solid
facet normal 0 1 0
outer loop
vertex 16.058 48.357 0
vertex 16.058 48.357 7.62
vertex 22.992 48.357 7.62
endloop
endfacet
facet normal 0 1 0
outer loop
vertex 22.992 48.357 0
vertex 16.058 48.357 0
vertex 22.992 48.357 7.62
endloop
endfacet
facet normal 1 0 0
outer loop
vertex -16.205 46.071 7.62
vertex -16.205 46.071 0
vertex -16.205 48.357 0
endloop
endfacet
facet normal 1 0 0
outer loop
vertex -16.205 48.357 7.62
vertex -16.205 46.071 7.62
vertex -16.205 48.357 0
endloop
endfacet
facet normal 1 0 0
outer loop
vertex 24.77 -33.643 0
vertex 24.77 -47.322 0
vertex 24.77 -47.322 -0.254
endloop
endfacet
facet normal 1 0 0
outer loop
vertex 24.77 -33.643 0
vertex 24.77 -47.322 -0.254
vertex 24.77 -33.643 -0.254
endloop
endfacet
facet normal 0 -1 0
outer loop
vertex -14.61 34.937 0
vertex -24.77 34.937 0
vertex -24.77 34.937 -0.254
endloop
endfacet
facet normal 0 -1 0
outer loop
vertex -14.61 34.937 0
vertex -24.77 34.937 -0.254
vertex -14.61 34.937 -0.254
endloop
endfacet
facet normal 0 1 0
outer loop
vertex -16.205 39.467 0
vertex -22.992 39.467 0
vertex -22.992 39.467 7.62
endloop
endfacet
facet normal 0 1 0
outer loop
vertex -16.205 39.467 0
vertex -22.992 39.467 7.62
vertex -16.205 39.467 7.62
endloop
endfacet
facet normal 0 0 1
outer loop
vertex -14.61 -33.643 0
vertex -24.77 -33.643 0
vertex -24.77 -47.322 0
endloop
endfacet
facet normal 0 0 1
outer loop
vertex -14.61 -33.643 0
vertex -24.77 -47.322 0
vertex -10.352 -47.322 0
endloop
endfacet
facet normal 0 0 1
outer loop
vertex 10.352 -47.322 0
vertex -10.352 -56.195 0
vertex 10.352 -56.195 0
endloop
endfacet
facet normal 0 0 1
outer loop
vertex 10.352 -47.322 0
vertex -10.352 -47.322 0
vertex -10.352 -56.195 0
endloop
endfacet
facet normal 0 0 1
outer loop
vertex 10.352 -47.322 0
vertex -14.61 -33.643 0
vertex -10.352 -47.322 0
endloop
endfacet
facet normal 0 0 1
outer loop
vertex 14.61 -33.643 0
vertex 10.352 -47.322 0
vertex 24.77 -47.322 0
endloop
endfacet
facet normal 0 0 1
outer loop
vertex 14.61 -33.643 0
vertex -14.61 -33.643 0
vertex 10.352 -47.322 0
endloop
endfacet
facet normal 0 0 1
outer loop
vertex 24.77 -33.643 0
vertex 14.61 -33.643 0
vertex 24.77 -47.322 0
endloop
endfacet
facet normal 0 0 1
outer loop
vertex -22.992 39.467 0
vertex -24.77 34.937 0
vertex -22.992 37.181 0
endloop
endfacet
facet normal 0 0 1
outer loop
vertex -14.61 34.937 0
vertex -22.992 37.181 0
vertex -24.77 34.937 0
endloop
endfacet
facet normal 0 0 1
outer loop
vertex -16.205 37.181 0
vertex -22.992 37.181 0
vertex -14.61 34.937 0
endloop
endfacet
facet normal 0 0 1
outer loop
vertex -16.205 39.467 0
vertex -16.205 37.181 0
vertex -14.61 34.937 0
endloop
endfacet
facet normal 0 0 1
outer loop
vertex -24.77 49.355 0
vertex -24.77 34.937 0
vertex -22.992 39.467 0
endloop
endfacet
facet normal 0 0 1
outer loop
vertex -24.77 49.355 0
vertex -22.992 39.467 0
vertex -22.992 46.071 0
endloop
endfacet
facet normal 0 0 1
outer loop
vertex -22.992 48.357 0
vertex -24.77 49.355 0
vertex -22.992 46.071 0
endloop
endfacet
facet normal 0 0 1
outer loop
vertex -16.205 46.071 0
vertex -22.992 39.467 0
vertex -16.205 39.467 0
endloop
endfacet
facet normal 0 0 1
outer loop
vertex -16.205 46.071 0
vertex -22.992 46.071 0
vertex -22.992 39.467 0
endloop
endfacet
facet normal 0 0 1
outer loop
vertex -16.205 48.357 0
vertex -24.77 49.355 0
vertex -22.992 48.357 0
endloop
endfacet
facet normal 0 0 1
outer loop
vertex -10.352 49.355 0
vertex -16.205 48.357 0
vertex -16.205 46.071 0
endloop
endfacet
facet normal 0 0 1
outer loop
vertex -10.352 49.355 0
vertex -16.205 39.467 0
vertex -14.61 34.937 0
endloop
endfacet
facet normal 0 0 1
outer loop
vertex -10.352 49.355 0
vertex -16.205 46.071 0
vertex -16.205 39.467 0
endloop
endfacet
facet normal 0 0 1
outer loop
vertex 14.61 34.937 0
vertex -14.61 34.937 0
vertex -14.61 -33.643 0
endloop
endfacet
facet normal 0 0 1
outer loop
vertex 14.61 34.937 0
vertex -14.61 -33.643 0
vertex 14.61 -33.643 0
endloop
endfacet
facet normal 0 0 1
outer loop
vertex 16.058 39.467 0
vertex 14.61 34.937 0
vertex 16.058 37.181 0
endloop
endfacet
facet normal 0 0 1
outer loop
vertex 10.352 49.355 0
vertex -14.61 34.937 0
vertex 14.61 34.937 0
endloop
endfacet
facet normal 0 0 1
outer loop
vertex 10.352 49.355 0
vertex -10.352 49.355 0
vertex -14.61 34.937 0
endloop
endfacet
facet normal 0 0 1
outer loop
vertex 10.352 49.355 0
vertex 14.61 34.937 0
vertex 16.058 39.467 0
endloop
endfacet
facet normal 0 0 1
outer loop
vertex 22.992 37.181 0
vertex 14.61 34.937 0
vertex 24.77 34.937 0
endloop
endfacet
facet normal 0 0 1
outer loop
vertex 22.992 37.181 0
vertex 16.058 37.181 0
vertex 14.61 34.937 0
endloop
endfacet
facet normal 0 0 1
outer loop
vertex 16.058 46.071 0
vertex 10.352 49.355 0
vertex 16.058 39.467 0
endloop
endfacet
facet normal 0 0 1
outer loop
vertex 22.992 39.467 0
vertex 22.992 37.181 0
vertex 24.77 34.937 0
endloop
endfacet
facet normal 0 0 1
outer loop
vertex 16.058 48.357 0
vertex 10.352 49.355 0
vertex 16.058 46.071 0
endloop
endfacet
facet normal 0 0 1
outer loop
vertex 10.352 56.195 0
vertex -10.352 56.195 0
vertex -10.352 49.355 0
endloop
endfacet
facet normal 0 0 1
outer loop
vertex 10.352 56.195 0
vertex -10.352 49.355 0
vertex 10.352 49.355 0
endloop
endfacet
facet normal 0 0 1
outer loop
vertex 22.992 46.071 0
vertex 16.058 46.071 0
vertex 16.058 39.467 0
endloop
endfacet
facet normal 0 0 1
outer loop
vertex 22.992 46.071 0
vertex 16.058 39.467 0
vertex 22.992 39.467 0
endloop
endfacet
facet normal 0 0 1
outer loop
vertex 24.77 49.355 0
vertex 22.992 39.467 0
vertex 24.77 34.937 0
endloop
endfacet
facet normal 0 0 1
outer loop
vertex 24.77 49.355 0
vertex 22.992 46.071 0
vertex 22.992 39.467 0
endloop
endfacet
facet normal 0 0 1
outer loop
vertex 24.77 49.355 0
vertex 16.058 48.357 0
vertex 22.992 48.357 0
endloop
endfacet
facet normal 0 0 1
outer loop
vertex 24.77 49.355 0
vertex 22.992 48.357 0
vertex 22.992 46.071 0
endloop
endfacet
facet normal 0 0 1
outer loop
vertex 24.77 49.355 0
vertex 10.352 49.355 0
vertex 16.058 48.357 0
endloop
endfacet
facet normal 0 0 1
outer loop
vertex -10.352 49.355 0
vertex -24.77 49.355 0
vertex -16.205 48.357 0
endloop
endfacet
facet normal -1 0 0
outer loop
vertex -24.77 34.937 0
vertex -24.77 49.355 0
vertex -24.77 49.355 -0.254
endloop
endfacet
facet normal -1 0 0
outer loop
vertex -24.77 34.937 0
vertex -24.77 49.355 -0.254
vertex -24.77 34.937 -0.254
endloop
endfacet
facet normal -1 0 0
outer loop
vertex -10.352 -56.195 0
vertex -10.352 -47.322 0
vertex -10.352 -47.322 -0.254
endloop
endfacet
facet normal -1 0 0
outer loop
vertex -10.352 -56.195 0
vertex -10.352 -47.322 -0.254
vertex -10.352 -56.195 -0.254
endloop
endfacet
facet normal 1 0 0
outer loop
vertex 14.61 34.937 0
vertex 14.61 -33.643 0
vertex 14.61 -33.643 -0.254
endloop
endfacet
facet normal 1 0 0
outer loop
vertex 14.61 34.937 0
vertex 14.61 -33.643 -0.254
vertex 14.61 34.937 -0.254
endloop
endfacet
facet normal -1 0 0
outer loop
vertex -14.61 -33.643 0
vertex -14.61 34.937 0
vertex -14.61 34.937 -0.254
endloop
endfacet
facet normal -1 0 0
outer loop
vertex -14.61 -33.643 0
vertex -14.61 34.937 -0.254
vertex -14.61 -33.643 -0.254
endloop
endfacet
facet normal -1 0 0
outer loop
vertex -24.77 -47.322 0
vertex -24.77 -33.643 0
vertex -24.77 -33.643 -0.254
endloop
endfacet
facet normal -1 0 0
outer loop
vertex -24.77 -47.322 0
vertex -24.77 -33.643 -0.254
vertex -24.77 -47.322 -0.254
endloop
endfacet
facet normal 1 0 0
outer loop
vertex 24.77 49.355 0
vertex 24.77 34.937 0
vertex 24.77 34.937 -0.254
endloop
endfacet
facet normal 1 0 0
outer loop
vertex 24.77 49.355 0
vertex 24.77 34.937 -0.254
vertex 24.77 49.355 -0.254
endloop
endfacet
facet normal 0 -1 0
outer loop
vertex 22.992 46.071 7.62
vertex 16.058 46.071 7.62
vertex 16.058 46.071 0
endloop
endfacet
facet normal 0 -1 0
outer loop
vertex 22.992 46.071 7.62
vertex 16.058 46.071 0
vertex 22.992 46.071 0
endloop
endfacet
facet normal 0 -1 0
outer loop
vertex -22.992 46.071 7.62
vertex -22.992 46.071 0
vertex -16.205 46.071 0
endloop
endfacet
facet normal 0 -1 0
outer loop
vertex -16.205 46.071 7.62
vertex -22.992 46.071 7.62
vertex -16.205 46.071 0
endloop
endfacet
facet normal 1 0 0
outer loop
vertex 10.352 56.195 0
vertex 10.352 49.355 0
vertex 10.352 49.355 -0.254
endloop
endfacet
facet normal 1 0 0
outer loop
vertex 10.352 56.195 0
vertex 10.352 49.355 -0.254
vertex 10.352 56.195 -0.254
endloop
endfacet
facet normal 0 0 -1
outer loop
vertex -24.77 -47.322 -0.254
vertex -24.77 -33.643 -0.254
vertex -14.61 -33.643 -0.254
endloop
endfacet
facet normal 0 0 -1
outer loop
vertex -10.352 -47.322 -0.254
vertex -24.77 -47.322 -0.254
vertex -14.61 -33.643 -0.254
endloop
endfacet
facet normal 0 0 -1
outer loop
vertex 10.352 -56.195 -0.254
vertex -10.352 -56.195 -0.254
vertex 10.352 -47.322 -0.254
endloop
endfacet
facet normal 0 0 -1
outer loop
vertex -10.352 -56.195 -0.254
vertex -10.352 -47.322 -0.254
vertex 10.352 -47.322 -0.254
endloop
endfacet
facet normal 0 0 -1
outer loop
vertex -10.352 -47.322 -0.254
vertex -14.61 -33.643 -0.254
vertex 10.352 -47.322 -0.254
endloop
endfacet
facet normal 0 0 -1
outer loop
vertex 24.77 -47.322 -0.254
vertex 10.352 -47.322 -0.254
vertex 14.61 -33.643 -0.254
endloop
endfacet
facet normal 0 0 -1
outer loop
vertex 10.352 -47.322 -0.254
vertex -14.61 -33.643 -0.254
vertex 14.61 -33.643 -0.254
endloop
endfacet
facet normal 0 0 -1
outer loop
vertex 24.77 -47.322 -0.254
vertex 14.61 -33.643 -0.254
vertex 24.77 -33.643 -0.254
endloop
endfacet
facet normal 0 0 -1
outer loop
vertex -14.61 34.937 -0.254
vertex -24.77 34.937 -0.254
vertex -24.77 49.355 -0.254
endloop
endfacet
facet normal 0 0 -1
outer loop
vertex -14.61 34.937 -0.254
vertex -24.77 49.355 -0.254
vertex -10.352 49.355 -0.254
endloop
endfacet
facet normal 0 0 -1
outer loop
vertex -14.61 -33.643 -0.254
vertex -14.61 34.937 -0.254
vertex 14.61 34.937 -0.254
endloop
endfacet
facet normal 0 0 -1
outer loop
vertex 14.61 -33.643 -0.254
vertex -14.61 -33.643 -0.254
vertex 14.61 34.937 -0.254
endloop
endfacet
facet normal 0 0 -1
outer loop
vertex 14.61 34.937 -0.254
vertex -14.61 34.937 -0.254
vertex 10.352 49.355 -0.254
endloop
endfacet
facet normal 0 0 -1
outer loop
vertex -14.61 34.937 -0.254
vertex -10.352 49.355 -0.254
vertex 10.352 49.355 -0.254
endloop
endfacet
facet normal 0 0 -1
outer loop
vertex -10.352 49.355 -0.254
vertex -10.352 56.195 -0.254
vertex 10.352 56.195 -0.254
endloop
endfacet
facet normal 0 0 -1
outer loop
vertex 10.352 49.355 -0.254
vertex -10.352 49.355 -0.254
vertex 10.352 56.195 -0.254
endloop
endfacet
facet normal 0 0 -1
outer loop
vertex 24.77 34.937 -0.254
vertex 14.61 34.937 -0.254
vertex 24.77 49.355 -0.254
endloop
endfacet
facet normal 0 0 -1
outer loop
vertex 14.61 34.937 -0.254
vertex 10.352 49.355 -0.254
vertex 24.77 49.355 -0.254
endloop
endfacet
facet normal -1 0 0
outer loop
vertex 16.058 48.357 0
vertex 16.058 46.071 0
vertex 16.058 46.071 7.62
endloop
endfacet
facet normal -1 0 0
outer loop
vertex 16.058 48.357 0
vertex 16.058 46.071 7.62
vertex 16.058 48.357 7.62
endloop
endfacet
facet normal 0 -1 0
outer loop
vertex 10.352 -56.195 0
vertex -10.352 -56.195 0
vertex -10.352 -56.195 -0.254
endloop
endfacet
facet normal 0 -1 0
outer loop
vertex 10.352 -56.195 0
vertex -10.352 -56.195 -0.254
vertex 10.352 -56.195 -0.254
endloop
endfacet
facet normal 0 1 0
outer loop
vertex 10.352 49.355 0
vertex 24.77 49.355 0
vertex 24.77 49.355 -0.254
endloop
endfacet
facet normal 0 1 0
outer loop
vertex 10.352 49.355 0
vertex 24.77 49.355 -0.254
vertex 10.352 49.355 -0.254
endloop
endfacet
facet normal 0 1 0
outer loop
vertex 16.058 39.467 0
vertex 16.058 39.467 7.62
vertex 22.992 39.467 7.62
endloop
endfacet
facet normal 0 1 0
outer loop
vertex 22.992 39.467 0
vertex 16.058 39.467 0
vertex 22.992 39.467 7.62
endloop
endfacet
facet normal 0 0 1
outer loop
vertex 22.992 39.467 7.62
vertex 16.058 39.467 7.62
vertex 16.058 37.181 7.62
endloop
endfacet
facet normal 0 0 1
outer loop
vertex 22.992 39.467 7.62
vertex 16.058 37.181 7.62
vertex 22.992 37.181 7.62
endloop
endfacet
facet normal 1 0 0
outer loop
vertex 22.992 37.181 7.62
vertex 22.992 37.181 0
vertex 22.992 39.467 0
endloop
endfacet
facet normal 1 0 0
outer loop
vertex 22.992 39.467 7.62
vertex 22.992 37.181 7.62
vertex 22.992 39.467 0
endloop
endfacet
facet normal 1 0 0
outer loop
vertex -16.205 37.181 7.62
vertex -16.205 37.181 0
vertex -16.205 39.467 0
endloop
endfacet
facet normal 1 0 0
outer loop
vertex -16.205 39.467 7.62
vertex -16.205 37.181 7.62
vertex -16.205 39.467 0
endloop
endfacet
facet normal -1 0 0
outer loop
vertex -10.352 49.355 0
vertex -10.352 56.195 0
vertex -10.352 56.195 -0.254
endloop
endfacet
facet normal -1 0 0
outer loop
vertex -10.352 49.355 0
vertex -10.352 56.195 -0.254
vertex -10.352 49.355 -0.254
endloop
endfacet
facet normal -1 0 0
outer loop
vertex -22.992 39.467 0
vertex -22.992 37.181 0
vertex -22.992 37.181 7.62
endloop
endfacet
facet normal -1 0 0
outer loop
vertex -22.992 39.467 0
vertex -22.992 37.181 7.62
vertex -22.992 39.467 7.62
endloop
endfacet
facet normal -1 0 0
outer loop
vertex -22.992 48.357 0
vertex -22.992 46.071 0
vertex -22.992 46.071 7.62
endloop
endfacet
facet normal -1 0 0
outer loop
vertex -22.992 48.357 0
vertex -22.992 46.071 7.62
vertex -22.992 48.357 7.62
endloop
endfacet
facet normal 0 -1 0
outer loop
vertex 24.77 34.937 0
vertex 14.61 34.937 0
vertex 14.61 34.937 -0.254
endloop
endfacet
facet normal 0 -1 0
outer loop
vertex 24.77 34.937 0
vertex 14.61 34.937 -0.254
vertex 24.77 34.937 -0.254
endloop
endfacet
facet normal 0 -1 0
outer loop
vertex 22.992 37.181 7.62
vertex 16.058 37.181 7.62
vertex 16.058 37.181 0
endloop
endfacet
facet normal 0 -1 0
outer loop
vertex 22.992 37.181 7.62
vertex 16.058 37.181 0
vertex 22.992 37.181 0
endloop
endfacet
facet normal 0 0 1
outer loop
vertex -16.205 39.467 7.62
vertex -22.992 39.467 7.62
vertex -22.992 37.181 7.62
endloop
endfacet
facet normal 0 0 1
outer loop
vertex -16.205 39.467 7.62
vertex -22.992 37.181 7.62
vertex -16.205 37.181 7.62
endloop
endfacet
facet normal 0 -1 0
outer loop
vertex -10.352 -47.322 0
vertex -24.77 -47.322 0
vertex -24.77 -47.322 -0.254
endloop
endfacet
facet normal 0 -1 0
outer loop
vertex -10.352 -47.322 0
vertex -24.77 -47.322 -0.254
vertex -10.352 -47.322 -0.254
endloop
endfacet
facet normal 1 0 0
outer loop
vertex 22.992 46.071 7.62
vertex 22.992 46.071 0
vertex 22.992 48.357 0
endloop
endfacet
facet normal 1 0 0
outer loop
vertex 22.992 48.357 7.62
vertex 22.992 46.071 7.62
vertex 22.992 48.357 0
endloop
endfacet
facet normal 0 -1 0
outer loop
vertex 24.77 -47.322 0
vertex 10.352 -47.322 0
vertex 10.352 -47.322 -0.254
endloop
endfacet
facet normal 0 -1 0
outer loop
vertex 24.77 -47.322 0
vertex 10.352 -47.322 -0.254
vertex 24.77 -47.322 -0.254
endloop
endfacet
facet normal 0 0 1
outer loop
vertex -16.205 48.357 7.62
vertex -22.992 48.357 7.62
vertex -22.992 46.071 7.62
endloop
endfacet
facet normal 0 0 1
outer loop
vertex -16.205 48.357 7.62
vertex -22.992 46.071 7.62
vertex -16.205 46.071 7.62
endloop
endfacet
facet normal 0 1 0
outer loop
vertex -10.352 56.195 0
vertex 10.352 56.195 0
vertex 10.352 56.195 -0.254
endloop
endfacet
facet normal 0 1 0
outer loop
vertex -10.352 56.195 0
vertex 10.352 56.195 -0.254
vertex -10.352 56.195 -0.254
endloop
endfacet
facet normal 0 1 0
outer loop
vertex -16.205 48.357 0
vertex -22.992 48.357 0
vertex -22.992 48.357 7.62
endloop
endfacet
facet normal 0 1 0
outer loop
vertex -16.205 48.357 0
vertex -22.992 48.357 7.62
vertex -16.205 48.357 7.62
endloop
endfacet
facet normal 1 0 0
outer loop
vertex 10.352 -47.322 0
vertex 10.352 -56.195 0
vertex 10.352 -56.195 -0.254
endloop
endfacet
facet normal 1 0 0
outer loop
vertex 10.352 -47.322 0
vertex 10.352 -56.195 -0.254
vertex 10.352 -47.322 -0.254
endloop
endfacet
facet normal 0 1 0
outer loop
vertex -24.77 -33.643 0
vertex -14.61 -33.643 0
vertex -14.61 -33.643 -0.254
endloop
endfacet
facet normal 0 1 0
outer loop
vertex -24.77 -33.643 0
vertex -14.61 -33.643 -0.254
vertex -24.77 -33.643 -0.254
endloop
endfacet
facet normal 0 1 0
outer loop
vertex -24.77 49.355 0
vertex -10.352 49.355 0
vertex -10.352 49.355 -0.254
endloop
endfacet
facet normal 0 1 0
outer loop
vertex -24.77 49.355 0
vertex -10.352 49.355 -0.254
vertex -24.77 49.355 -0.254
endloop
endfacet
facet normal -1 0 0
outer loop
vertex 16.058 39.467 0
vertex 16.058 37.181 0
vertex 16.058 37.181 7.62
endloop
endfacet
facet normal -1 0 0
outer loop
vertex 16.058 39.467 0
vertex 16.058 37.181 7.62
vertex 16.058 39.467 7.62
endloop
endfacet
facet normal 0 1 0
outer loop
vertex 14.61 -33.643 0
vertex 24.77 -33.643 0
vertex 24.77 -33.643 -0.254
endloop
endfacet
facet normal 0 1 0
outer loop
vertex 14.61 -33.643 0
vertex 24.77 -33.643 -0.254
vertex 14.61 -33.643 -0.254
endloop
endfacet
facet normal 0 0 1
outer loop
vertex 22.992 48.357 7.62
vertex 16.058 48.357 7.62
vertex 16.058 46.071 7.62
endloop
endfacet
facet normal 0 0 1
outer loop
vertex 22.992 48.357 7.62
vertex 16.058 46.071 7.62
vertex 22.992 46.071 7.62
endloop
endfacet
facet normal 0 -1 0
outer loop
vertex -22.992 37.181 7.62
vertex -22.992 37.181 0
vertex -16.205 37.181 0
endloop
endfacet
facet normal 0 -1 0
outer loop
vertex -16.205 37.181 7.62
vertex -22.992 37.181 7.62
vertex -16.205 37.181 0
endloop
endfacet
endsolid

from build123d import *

# Parameters (mm, degrees)
F1_DEPTH = 0.254
F2_W     = 6.786758
F2_H     = 2.286
F2_W_2   = 6.9342
F3_DEPTH = 7.62


with BuildPart() as f1:
    # F0 (on Top) → F1 (new body)
    with BuildSketch(Plane.XY):
        Polygon((-10.351698, -56.194937), (10.351697, -56.194937), (10.351697, -47.322049), (24.770136, -47.322049), (24.770136, -33.643018), (14.610136, -33.643018), (14.610136, 34.936982), (24.770136, 34.936982), (24.770136, 49.355418), (10.351697, 49.355418), (10.351697, 56.194937), (-10.351698, 56.194937), (-10.351698, 49.355418), (-24.770136, 49.355418), (-24.770136, 34.936982), (-14.610136, 34.936982), (-14.610136, -33.643018), (-24.770136, -33.643018), (-24.770136, -47.322049), (-10.351698, -47.322049), align=None)
    extrude(amount=-F1_DEPTH)

    # F2 (on face) → F3 (join)
    with BuildSketch(Plane.XY):
        with Locations((-19.598757, 47.214477)):
            Rectangle(F2_W, F2_H)
        with Locations((-19.598757, 38.324477)):
            Rectangle(F2_W, F2_H)
        with Locations((19.525036, 38.324478)):
            Rectangle(F2_W_2, F2_H)
        with Locations((19.525036, 47.214478)):
            Rectangle(F2_W_2, F2_H)
    extrude(amount=F3_DEPTH)


solid = f1.part
